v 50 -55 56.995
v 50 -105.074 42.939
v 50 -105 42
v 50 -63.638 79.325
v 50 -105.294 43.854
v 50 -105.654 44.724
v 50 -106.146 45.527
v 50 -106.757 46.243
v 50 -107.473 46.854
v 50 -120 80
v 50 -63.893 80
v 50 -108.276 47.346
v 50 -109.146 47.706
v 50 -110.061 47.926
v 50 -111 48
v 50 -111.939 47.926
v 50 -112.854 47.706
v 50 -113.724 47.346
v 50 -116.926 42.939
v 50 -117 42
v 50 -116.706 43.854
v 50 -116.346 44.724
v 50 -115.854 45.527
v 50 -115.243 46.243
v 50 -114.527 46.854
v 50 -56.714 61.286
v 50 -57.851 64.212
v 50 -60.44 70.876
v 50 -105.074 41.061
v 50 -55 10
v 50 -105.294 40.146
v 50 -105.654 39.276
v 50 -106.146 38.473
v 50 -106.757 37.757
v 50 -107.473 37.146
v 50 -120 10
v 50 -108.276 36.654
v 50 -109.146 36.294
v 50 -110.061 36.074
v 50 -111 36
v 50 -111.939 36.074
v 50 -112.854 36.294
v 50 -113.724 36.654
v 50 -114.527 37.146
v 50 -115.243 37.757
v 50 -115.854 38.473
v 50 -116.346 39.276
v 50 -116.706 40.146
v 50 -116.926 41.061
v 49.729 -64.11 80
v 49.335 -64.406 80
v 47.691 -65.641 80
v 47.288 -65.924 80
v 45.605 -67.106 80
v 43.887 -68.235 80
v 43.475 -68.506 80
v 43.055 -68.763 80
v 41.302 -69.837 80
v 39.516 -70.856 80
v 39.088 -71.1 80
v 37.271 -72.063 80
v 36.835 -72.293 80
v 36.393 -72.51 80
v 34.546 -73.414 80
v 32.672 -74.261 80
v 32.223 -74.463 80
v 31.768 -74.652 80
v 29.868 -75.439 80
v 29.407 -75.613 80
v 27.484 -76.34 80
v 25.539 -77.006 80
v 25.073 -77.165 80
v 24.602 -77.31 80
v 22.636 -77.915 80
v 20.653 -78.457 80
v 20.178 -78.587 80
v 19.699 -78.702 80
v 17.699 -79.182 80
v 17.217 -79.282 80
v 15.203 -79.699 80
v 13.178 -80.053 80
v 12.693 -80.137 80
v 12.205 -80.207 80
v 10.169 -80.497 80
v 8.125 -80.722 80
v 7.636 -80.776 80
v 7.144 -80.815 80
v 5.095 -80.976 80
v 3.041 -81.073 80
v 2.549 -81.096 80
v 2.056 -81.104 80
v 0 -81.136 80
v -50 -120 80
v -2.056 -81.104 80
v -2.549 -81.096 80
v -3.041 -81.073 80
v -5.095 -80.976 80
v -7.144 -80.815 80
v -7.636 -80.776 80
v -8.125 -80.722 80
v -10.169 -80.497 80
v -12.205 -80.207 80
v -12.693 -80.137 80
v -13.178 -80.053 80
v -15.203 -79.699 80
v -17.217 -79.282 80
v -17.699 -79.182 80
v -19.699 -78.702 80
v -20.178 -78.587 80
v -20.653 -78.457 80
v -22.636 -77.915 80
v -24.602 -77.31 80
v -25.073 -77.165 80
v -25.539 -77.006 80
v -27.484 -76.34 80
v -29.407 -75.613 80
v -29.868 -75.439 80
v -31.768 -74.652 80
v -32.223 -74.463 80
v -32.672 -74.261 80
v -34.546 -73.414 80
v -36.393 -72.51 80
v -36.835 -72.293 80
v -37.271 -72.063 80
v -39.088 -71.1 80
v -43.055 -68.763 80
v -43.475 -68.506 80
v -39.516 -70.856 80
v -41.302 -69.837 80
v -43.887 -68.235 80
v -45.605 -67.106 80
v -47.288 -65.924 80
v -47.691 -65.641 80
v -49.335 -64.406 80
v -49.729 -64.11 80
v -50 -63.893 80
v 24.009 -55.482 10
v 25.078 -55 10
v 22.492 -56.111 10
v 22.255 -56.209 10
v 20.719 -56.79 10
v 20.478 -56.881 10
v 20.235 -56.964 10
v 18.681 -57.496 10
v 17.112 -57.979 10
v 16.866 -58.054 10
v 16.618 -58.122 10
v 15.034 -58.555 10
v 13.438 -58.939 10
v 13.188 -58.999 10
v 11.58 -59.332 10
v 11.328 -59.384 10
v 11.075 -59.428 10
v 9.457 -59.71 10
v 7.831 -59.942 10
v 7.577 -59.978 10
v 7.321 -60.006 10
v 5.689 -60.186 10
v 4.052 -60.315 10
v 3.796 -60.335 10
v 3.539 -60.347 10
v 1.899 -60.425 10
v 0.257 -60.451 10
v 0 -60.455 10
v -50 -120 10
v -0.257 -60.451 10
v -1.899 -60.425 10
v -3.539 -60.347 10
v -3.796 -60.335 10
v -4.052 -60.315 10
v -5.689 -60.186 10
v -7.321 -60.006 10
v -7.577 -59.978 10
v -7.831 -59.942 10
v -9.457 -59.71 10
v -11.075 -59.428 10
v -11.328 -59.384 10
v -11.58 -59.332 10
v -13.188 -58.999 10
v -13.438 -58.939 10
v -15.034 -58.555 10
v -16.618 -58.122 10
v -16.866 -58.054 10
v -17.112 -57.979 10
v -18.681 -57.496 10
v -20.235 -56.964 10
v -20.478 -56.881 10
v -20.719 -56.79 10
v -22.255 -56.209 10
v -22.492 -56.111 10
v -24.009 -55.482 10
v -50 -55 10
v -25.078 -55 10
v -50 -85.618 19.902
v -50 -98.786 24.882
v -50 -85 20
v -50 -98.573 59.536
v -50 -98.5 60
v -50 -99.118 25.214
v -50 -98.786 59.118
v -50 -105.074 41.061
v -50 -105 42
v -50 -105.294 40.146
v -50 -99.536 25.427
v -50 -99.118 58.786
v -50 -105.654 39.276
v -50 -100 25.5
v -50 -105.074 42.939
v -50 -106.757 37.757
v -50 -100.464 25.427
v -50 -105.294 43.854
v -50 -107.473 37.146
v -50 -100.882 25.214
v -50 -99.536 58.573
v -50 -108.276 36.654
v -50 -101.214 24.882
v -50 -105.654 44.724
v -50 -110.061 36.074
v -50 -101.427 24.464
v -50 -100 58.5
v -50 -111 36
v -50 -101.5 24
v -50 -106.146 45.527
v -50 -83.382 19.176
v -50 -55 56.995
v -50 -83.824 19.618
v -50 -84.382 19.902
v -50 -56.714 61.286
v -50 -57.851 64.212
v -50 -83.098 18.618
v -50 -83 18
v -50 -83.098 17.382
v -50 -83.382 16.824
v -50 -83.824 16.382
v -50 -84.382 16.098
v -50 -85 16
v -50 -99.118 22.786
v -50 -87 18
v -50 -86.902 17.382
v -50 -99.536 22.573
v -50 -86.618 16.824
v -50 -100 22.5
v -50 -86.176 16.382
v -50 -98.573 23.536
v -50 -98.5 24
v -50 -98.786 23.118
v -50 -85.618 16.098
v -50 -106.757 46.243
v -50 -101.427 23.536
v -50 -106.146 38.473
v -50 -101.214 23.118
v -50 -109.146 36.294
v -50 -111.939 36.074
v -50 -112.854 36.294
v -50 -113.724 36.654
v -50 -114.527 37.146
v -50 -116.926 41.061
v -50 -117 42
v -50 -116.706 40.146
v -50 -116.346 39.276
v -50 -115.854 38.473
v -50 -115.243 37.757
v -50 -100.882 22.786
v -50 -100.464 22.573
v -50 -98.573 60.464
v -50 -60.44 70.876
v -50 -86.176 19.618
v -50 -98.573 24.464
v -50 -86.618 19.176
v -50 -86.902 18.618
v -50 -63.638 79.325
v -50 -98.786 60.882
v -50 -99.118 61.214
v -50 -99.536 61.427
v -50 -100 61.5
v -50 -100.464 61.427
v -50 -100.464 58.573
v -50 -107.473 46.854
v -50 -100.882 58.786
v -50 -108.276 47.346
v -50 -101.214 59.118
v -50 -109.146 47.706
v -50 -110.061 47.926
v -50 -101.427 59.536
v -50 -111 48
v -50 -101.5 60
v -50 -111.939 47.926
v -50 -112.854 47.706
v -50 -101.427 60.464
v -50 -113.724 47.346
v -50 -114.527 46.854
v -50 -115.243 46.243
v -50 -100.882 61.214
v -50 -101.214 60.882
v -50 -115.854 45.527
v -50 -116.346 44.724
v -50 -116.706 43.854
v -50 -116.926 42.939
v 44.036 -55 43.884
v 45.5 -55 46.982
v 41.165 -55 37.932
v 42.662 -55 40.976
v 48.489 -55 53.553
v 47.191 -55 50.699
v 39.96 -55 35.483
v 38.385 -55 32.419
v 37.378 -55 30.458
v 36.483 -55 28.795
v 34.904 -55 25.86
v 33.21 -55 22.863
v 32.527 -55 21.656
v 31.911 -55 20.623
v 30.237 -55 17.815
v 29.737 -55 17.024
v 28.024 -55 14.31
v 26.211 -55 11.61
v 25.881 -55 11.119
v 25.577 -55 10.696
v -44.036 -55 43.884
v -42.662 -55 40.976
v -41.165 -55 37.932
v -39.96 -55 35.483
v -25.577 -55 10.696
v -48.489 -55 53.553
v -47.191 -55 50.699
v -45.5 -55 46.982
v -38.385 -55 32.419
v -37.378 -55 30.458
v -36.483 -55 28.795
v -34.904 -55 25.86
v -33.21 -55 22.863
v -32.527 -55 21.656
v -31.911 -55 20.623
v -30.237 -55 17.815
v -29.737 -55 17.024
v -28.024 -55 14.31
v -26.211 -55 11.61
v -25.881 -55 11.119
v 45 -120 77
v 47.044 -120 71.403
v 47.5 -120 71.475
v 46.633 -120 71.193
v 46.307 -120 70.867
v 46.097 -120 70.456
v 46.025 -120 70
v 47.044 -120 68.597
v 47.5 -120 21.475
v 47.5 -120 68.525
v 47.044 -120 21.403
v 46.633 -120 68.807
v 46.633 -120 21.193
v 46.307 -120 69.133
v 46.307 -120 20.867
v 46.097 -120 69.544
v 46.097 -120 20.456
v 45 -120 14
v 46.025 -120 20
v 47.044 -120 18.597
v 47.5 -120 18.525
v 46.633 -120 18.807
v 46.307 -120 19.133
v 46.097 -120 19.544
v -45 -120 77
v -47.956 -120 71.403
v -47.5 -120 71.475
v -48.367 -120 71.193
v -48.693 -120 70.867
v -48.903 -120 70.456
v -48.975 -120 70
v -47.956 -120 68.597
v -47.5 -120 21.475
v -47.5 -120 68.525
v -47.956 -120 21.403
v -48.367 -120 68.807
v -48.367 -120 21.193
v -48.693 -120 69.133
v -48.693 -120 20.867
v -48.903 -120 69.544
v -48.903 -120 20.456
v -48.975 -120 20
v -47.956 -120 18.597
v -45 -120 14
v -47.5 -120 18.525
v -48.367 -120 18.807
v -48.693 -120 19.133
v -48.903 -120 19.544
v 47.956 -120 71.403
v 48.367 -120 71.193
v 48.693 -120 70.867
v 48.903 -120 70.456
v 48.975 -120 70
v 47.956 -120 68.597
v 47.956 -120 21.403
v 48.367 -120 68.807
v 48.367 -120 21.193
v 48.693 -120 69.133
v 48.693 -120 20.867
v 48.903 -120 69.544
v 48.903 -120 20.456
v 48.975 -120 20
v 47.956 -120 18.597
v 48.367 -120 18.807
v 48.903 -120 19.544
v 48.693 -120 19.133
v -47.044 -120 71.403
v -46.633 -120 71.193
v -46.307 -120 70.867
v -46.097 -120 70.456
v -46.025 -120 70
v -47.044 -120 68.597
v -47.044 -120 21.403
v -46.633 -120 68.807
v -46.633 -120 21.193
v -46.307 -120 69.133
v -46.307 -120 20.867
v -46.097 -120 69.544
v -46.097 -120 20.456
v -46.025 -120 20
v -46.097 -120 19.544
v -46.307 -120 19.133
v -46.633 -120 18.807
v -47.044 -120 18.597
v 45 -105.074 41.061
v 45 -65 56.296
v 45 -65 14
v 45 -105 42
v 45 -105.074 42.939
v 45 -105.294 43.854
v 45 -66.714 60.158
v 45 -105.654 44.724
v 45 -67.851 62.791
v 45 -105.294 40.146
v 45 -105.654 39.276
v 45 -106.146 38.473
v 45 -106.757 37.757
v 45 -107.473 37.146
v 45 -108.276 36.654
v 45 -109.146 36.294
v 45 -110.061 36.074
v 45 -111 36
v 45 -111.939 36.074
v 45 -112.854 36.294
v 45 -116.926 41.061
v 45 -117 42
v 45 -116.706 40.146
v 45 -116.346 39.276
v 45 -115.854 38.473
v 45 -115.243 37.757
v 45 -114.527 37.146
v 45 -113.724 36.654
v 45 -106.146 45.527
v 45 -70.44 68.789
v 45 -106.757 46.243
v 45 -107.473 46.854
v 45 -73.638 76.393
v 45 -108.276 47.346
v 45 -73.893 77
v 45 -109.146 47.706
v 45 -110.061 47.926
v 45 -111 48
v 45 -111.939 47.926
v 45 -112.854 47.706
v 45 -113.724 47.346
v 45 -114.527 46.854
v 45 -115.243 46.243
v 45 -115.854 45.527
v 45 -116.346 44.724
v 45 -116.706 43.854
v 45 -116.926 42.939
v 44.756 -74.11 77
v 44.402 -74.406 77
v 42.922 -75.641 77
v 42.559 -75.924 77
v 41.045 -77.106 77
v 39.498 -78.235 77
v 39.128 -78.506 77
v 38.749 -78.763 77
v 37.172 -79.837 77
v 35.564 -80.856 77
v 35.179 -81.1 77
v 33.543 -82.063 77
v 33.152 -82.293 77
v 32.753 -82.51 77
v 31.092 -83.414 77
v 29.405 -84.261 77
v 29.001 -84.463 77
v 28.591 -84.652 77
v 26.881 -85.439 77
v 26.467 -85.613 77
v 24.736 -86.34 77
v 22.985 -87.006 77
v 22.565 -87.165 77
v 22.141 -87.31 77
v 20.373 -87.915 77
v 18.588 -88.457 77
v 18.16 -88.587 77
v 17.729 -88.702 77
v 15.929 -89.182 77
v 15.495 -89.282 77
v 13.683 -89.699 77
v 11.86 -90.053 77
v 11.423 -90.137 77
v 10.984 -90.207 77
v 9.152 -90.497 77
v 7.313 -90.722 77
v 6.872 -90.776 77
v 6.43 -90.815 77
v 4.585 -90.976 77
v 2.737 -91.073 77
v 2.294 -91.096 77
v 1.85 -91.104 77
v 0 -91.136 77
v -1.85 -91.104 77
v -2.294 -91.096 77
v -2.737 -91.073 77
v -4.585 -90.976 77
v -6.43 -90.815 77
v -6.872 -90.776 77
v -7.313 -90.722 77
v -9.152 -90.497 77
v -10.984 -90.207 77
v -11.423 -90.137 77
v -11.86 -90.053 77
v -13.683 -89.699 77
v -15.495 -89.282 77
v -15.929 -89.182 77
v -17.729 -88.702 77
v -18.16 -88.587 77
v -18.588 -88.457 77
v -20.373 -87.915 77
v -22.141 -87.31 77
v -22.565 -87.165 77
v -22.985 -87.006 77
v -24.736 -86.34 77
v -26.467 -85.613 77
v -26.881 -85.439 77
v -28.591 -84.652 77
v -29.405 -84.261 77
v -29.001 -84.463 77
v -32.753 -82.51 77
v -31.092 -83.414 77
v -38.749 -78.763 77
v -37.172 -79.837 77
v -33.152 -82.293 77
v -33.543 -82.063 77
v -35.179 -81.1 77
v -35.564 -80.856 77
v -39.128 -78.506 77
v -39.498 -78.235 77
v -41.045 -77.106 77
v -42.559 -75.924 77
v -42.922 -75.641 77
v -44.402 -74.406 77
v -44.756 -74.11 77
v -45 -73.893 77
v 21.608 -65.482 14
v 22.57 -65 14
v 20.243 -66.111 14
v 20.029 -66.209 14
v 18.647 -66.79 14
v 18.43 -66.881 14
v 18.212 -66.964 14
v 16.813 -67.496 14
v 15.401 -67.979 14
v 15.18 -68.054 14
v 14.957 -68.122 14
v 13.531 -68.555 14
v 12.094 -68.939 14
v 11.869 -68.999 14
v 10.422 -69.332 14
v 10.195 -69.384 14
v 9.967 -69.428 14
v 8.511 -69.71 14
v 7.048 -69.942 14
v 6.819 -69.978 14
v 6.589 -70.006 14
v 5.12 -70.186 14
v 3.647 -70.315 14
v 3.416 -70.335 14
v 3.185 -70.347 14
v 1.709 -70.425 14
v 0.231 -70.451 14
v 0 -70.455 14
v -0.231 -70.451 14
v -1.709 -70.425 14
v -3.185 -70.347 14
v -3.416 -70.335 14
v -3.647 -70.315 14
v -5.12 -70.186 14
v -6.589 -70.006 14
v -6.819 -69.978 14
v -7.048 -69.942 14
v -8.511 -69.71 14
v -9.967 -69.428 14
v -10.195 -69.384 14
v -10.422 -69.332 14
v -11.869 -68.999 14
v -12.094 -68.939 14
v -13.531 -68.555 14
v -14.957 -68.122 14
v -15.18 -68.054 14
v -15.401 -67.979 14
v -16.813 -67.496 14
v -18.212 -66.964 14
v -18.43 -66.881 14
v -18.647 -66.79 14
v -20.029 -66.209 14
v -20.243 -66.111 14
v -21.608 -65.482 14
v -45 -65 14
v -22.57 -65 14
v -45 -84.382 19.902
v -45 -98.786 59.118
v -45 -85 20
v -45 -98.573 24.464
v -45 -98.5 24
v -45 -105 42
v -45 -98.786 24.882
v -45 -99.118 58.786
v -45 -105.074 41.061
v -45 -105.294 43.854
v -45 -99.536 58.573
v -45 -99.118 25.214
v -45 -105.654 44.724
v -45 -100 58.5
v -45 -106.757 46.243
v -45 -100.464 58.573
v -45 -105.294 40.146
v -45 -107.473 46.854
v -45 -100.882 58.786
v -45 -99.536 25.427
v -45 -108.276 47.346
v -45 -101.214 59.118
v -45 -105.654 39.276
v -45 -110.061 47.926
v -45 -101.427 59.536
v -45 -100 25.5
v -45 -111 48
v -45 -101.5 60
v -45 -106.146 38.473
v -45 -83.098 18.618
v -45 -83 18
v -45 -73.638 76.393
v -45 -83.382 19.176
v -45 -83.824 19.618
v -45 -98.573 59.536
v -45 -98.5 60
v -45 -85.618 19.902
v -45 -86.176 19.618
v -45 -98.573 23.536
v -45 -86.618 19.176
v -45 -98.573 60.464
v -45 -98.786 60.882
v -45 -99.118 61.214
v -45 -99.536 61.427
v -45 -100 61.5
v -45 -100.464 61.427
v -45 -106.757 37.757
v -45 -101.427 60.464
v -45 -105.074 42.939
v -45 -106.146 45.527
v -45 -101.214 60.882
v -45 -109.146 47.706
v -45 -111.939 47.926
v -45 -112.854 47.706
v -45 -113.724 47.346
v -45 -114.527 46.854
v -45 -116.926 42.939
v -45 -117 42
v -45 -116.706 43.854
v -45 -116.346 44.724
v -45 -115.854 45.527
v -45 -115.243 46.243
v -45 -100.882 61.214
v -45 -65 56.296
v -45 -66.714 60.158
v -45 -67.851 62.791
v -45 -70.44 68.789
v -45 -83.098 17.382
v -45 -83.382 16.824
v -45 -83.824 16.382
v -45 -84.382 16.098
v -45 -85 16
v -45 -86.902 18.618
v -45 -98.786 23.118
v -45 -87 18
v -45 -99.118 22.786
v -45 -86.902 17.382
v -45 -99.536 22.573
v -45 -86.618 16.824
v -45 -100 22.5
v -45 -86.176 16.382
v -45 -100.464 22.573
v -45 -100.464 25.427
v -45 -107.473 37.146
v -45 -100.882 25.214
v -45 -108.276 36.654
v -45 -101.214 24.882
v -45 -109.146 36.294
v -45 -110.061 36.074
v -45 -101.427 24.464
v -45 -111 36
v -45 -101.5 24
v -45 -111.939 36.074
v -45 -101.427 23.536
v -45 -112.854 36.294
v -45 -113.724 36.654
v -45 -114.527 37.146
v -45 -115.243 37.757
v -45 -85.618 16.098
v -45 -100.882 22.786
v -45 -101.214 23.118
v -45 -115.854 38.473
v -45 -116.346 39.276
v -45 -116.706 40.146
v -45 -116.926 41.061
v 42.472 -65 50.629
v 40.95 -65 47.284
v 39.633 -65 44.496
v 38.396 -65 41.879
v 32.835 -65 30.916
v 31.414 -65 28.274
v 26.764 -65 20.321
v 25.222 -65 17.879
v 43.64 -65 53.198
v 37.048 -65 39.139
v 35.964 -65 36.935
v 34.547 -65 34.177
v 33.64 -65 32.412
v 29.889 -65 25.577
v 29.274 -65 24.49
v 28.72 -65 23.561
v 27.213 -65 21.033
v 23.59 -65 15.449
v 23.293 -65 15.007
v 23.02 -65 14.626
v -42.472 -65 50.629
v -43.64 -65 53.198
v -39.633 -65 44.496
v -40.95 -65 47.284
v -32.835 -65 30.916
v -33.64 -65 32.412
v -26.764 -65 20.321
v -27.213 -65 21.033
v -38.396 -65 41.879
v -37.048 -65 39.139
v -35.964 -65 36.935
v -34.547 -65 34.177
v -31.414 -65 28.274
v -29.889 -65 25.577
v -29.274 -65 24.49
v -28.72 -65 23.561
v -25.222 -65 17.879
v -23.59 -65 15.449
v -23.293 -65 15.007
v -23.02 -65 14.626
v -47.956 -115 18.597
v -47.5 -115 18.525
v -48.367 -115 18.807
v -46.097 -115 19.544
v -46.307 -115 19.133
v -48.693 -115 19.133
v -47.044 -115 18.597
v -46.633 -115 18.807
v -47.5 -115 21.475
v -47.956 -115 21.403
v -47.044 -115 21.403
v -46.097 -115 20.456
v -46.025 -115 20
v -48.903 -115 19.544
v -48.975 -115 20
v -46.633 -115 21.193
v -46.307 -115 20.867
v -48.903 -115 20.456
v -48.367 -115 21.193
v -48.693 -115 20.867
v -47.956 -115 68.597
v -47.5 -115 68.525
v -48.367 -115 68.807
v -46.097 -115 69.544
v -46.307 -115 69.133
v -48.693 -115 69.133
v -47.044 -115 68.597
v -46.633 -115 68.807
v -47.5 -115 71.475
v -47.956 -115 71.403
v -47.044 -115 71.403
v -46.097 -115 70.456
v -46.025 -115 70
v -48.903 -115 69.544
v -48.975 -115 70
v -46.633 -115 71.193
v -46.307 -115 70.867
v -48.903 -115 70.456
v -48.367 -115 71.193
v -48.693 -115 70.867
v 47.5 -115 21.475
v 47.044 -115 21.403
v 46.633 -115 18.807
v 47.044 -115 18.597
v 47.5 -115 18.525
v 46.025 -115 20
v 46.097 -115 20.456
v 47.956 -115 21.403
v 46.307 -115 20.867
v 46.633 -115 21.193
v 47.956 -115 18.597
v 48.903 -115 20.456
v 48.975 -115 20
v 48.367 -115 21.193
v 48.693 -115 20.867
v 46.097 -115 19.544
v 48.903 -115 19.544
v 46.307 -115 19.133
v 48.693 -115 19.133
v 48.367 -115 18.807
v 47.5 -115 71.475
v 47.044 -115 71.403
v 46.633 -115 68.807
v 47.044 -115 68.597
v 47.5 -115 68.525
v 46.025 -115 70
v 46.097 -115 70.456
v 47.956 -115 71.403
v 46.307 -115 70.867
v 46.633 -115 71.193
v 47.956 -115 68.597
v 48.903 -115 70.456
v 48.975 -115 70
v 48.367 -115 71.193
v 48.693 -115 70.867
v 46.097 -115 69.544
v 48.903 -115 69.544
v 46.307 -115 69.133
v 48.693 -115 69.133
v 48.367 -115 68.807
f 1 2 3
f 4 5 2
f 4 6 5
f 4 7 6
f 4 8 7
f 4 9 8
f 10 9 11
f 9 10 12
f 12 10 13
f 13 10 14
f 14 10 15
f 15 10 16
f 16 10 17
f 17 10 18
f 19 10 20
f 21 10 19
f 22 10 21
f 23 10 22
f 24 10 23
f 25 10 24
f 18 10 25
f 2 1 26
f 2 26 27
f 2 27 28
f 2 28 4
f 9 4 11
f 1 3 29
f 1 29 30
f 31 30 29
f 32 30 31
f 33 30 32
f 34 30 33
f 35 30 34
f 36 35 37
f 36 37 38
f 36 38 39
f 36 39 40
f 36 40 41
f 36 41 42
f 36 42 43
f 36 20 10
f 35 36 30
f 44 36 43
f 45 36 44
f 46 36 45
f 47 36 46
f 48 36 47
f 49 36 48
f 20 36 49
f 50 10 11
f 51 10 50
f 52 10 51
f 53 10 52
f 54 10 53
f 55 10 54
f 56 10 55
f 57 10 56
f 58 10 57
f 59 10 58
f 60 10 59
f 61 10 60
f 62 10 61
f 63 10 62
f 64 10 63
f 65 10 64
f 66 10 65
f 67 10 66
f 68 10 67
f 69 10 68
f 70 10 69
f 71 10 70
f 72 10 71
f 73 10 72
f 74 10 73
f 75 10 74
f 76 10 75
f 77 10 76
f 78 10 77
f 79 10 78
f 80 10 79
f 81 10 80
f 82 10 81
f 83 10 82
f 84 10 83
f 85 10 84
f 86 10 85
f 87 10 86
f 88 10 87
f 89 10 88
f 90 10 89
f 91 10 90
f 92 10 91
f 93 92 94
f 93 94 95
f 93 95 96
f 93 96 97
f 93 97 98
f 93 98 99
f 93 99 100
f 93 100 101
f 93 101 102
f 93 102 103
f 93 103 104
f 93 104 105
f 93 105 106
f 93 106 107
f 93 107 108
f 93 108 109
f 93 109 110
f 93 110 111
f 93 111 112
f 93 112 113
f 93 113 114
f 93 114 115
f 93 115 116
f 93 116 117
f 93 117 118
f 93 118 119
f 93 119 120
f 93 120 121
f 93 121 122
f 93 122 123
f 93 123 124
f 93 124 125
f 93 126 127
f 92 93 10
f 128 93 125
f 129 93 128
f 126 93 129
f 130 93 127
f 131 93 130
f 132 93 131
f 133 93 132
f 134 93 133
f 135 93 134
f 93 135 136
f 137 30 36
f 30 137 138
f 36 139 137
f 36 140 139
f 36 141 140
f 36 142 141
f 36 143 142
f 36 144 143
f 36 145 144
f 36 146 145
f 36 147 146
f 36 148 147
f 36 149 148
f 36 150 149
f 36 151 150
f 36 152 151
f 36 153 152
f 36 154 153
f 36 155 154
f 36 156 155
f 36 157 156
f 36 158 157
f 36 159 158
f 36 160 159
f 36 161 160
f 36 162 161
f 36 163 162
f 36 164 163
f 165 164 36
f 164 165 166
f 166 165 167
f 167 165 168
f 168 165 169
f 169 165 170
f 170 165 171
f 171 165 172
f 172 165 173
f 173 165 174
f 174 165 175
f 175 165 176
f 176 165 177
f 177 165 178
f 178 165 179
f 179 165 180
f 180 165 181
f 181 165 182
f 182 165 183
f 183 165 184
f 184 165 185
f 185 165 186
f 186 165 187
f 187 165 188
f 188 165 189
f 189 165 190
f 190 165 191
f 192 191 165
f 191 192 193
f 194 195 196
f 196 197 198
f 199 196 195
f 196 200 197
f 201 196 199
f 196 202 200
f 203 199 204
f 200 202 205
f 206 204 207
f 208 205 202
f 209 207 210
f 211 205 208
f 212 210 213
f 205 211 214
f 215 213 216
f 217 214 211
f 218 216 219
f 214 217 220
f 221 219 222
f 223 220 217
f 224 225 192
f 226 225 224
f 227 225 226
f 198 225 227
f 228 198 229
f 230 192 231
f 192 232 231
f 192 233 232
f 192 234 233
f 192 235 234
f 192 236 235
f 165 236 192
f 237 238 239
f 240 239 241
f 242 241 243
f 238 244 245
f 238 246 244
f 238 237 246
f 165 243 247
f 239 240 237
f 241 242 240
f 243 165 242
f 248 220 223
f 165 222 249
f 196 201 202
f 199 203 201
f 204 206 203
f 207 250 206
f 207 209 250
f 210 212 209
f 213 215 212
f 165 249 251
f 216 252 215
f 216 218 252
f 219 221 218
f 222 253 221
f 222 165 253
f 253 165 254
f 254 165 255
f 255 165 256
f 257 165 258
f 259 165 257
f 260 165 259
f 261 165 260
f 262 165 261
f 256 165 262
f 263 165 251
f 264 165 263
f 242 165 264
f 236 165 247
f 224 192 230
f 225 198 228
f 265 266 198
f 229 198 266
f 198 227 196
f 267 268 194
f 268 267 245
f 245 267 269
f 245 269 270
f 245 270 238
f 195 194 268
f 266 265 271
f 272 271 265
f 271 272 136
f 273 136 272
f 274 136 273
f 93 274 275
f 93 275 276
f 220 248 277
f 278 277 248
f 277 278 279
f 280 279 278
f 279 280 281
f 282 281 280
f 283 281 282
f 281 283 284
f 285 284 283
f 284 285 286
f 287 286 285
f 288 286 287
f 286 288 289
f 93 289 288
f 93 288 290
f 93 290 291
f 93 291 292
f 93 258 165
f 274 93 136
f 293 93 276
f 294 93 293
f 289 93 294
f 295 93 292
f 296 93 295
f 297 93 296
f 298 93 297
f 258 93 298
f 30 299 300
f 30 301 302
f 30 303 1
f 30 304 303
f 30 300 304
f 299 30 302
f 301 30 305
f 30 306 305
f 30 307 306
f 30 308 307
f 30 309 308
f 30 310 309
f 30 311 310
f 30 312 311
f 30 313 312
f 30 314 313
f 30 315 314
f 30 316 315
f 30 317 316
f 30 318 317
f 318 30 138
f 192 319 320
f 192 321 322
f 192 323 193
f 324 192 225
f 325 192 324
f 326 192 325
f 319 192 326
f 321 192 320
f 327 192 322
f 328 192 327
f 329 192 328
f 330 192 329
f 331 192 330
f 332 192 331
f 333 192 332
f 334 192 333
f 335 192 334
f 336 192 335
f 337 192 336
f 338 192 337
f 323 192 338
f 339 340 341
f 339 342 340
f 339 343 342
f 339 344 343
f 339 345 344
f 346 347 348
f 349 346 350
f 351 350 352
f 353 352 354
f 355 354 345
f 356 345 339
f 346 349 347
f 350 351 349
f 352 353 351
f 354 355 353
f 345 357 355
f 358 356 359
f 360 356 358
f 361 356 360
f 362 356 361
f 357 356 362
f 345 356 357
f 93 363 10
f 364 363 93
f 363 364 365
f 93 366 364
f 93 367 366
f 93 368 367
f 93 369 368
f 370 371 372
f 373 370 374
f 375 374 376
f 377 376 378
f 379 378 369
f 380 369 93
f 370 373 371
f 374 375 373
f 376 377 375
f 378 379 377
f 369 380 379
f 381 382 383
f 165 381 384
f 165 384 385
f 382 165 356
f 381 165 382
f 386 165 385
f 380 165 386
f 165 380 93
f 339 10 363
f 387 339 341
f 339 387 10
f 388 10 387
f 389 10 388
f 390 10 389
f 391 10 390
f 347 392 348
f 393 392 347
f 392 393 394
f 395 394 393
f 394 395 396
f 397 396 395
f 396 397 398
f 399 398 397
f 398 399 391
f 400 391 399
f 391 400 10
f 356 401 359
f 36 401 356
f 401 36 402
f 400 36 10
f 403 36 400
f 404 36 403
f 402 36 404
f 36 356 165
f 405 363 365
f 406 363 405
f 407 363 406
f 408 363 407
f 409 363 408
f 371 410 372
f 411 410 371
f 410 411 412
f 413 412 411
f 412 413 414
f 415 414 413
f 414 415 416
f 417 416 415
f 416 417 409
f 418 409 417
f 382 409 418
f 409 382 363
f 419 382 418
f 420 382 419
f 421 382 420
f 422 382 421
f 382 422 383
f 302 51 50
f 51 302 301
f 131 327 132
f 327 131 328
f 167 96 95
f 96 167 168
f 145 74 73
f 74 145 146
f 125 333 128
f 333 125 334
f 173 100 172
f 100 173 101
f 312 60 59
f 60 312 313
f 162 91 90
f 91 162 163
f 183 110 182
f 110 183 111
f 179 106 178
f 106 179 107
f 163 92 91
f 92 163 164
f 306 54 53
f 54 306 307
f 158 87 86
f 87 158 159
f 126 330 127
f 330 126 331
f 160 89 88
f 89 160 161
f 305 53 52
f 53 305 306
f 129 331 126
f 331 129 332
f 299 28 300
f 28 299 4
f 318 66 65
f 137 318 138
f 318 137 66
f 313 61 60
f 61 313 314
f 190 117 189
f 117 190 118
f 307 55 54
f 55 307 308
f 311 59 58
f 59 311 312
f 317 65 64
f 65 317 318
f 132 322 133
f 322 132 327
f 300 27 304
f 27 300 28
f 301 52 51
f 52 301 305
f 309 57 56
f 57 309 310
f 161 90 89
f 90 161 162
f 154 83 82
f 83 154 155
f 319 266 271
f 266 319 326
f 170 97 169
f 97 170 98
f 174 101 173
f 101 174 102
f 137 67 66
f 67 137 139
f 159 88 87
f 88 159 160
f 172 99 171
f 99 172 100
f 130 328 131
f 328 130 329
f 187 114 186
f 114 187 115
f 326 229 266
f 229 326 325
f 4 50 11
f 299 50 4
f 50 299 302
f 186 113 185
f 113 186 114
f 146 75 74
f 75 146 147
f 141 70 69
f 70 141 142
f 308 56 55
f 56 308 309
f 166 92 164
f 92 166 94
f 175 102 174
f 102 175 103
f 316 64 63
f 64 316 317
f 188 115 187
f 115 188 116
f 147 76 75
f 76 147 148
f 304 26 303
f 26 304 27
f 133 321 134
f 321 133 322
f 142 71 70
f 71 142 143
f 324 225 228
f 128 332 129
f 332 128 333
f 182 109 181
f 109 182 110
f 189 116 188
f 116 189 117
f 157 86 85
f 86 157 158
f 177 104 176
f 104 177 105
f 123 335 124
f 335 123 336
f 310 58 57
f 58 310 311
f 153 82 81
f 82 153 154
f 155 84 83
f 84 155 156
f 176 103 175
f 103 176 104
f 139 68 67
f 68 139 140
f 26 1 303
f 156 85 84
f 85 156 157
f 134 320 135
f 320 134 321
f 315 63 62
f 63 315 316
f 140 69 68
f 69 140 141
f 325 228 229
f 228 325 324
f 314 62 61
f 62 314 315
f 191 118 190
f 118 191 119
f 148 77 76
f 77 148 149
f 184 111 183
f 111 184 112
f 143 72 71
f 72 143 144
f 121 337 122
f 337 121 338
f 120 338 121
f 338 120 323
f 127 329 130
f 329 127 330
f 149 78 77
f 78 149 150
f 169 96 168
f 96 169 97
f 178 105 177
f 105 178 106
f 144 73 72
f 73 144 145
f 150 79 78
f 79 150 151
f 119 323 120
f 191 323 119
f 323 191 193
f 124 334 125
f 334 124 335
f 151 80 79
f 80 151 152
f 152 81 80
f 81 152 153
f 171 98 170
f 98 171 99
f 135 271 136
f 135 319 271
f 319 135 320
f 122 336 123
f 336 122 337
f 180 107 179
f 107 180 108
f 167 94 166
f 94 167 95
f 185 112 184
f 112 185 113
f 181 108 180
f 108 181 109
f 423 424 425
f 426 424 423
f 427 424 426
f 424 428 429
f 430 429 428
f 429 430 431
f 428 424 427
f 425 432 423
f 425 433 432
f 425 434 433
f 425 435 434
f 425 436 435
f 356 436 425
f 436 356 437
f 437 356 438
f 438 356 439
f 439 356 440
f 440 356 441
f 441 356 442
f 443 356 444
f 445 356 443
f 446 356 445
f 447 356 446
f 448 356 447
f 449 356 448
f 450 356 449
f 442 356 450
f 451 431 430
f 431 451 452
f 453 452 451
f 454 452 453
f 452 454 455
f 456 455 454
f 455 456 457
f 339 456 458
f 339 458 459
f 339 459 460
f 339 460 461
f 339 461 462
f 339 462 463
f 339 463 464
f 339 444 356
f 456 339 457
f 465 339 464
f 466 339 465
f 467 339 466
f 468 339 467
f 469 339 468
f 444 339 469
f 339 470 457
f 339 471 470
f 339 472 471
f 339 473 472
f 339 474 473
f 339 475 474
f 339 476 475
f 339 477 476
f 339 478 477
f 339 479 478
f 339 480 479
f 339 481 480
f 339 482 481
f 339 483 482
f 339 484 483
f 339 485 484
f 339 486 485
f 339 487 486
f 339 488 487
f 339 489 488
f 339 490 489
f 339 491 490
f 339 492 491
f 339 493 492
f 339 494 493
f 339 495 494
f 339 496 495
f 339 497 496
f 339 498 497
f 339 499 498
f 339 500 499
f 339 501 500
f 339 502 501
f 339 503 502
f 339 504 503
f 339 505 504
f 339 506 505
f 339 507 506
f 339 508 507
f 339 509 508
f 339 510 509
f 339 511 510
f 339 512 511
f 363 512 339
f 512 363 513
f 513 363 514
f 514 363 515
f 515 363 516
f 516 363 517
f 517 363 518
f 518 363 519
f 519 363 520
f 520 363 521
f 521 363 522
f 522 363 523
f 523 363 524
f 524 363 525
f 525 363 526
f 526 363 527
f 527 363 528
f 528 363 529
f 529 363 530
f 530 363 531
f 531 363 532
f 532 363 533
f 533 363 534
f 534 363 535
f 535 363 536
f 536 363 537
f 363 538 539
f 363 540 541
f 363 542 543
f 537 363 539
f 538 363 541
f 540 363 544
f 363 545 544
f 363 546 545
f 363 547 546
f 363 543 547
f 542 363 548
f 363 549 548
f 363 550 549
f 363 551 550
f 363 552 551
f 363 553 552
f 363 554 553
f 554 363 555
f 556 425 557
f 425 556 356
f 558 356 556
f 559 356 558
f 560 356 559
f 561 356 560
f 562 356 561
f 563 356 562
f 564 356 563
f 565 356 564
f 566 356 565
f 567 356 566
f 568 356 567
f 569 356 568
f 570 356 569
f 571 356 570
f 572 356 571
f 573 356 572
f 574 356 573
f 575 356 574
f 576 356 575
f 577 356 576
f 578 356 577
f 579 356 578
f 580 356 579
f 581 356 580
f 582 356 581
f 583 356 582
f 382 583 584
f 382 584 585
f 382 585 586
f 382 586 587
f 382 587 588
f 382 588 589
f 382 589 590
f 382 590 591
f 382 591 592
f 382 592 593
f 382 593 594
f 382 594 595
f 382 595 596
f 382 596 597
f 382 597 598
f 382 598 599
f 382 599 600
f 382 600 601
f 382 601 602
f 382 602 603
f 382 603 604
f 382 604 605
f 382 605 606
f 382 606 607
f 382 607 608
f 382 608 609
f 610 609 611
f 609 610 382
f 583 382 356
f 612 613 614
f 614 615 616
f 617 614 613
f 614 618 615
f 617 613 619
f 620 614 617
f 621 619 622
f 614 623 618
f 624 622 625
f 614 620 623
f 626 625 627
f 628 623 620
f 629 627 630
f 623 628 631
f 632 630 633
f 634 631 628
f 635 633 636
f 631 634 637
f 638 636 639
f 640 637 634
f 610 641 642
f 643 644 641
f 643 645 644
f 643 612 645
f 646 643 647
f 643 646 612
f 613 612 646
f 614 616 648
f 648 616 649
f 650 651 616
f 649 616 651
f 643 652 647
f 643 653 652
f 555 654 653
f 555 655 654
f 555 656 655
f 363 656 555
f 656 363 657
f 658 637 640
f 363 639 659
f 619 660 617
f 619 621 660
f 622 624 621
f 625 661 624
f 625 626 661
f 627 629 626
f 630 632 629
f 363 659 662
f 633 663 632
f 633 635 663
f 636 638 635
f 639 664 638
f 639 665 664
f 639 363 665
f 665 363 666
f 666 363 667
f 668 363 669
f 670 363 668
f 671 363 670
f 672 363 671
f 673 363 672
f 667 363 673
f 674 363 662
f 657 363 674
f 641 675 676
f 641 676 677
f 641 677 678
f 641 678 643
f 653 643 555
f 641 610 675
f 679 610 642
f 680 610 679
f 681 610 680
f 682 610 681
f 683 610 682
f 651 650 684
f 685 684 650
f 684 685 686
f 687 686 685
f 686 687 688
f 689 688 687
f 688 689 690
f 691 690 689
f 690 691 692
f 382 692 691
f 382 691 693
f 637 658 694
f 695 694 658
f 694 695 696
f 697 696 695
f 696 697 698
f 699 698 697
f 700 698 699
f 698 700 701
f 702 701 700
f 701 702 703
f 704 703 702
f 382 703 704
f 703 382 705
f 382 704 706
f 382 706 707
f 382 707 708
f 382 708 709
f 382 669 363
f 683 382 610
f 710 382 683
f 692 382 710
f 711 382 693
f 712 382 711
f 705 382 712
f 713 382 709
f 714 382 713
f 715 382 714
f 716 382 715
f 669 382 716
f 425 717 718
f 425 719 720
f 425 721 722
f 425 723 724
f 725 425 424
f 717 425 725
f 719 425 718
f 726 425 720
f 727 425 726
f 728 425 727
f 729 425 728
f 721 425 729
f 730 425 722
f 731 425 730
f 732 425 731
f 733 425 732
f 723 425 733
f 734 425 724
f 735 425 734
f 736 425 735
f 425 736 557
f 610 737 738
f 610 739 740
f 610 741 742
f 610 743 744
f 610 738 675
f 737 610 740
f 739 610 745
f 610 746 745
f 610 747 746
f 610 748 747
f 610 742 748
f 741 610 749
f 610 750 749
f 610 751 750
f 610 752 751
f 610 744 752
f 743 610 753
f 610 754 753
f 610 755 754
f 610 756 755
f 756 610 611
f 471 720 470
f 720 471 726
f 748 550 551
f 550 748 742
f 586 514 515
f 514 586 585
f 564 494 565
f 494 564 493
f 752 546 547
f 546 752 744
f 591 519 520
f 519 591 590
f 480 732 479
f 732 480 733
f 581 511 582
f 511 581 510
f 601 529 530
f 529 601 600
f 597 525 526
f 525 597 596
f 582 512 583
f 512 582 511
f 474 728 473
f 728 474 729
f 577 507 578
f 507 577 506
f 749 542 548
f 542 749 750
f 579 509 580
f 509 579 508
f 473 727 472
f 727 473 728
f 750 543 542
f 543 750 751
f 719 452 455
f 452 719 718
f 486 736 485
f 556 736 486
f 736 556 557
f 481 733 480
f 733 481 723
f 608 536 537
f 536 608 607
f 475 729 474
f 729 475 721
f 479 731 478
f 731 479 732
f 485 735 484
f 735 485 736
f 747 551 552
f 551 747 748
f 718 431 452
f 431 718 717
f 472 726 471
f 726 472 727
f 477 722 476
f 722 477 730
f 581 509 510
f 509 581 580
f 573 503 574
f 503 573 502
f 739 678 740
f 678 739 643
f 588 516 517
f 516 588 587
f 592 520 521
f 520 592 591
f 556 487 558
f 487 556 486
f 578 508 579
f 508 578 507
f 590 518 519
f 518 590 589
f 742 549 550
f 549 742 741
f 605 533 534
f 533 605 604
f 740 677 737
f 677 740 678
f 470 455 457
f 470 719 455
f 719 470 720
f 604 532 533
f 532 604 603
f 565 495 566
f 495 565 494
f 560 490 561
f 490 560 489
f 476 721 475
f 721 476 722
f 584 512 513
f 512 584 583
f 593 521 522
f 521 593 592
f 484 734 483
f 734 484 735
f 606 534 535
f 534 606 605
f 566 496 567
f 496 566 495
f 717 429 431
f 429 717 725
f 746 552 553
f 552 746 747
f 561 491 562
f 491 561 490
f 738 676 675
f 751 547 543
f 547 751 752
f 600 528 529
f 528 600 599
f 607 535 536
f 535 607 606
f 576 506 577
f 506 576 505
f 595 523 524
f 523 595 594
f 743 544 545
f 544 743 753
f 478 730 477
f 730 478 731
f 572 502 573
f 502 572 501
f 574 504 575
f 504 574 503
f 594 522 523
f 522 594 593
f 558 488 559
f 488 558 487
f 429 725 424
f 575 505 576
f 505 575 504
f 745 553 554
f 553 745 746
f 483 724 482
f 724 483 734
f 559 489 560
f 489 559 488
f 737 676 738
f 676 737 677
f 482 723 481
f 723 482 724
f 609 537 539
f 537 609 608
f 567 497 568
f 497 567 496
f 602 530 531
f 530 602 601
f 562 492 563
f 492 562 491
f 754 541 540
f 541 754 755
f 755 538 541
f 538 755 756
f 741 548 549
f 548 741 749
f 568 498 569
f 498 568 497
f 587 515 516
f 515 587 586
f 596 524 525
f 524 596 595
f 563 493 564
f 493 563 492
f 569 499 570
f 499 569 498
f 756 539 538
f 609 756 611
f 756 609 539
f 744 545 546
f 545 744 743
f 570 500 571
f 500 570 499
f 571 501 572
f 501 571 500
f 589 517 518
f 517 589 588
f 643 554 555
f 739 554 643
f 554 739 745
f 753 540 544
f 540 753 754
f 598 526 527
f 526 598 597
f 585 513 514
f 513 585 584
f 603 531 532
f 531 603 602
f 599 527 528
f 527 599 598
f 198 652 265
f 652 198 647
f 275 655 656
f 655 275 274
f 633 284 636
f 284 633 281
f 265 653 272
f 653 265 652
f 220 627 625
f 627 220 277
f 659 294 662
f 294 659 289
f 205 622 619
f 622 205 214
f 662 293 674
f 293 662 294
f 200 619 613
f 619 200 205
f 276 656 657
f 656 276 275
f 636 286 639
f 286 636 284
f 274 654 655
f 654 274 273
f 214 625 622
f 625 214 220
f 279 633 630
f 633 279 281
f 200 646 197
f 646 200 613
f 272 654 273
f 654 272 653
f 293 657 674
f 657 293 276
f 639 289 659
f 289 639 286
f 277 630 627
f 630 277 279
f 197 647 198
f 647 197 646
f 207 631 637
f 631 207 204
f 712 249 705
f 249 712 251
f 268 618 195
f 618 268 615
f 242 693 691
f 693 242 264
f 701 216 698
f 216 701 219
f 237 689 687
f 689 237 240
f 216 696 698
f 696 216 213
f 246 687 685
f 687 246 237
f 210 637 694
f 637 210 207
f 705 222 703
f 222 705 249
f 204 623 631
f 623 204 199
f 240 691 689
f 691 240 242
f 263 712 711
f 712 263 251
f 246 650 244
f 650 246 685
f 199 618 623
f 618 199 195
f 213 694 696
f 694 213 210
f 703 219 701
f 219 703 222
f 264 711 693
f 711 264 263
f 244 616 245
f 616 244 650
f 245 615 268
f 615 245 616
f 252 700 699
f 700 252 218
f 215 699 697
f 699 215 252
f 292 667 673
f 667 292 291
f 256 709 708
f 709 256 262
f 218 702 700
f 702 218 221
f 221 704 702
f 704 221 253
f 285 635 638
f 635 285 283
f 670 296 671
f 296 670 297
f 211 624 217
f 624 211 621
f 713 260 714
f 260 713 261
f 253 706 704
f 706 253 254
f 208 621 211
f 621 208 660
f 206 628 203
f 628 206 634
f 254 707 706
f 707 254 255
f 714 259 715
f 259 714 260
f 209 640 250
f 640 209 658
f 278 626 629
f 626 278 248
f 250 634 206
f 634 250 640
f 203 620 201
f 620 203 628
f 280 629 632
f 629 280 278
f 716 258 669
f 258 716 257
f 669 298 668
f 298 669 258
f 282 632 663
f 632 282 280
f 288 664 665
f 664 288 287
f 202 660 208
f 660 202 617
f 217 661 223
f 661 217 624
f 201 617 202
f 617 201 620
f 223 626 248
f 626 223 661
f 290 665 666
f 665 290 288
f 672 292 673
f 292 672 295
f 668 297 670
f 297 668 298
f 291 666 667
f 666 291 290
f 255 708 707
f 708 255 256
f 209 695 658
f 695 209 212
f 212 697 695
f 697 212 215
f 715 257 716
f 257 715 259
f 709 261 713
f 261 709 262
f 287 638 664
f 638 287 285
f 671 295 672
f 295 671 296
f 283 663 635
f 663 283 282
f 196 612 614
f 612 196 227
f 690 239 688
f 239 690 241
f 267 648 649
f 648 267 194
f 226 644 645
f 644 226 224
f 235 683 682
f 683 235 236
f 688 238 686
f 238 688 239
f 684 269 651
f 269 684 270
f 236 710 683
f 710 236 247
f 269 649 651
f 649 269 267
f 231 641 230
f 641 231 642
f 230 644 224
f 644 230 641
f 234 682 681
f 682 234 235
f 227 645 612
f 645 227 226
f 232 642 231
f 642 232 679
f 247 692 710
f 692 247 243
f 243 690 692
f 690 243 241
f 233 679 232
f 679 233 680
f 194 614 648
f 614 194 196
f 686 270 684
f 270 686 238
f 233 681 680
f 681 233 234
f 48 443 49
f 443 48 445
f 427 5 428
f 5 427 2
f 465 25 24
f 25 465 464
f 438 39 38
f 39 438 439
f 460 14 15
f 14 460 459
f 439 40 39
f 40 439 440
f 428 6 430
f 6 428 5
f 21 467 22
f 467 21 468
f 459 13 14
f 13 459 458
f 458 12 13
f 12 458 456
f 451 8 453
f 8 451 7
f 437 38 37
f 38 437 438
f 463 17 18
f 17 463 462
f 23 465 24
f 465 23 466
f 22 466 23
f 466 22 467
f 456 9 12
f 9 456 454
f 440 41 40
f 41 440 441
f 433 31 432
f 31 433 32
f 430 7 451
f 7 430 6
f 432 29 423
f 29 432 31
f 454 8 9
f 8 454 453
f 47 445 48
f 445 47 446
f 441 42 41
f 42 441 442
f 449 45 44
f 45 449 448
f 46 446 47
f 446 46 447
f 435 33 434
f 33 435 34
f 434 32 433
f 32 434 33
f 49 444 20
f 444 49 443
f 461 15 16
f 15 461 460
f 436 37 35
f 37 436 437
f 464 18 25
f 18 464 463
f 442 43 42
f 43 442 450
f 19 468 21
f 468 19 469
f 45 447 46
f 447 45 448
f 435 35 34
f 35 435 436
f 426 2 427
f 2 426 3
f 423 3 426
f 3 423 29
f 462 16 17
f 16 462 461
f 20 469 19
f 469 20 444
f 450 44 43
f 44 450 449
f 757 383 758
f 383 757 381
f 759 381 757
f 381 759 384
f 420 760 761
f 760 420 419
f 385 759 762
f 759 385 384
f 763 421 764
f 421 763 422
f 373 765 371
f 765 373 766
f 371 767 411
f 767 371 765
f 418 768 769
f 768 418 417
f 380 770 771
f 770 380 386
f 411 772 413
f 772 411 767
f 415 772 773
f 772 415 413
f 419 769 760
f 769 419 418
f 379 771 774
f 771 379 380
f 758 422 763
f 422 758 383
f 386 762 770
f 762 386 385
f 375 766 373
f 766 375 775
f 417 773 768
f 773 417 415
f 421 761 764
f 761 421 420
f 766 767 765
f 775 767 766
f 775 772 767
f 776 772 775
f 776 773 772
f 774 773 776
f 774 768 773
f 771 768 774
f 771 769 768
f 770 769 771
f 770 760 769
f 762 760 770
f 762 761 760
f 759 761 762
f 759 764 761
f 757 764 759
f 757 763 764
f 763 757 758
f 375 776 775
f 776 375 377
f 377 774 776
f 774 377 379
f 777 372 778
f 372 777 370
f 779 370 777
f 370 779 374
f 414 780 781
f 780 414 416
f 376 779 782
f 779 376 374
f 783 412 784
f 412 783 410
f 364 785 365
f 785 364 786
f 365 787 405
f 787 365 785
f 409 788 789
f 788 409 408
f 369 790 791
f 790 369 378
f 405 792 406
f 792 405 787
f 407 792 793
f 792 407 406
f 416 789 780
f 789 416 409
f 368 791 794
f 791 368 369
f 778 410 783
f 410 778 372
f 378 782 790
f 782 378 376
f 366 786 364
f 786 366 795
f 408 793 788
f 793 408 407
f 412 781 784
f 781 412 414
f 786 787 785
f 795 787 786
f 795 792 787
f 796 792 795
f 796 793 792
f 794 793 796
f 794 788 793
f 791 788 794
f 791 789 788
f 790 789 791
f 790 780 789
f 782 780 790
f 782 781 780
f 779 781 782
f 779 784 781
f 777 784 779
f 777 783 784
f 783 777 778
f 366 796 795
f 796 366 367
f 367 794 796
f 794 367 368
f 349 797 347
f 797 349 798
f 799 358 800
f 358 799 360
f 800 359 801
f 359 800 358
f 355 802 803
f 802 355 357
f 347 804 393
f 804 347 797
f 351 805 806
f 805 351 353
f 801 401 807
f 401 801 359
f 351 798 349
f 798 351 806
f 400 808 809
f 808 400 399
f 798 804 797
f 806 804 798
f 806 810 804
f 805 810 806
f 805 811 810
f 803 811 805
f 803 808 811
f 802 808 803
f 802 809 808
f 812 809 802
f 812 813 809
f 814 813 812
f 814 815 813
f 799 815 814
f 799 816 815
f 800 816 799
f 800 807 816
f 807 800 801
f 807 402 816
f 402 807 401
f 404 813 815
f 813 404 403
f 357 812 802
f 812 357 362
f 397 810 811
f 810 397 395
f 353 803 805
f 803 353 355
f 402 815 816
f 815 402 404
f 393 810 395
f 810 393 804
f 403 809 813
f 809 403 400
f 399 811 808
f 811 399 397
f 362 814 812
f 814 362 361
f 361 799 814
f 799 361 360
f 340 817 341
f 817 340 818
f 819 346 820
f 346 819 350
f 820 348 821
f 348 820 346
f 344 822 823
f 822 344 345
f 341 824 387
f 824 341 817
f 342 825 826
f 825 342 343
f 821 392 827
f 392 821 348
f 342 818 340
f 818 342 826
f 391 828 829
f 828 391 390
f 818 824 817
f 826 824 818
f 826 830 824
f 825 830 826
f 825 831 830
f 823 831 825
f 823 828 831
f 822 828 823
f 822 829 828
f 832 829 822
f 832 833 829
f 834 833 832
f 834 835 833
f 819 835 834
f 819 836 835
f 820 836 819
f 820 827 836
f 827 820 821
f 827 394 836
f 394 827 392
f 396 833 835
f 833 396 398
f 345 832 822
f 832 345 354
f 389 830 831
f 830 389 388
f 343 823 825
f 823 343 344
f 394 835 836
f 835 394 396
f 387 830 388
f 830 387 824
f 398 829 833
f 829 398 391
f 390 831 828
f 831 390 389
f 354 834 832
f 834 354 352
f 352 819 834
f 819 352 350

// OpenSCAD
//pot 11.5 ;18
module pot() {
    cylinder(d1=115,d2=180,h=110,$fn=200);
}
module boxout(){
    
difference(){
translate([-50,-120,10])
cube([100,65,70] );
pot();}}


module boxcase(){
difference(){
boxout();
translate([0,-10,5])
scale([.9,1,.9])
boxout();
}}


difference(){
boxcase();
    
translate([-51,-100,60])
rotate([0,90,0])
cylinder(d=3,h=7,$fn=20);

translate([-51,-100,24])
rotate([0,90,0])
cylinder(d=3,h=7,$fn=20);
    
translate([-51,-111,42])
rotate([0,90,0])
cylinder(d=12,h=7,$fn=40);

translate([-51,-85,18])
rotate([0,90,0])
cylinder(d=4,h=7,$fn=20);
    
translate([44,-111,42])
rotate([0,90,0])
cylinder(d=12,h=7,$fn=40);
//screw1
translate([-47.5,-122,20])
rotate([0,90,90])
cylinder(d=2.95,h=7,$fn=20);
//screw2
translate([-47.5,-122,70])
rotate([0,90,90])
cylinder(d=2.95,h=7,$fn=20);
//distance in Z , 50mm
//distance in X , 95mm
//screw3
translate([47.5,-122,20])
rotate([0,90,90])
cylinder(d=2.95,h=7,$fn=20);
//screw4
translate([47.5,-122,70])
rotate([0,90,90])
cylinder(d=2.95,h=7,$fn=20);
}
